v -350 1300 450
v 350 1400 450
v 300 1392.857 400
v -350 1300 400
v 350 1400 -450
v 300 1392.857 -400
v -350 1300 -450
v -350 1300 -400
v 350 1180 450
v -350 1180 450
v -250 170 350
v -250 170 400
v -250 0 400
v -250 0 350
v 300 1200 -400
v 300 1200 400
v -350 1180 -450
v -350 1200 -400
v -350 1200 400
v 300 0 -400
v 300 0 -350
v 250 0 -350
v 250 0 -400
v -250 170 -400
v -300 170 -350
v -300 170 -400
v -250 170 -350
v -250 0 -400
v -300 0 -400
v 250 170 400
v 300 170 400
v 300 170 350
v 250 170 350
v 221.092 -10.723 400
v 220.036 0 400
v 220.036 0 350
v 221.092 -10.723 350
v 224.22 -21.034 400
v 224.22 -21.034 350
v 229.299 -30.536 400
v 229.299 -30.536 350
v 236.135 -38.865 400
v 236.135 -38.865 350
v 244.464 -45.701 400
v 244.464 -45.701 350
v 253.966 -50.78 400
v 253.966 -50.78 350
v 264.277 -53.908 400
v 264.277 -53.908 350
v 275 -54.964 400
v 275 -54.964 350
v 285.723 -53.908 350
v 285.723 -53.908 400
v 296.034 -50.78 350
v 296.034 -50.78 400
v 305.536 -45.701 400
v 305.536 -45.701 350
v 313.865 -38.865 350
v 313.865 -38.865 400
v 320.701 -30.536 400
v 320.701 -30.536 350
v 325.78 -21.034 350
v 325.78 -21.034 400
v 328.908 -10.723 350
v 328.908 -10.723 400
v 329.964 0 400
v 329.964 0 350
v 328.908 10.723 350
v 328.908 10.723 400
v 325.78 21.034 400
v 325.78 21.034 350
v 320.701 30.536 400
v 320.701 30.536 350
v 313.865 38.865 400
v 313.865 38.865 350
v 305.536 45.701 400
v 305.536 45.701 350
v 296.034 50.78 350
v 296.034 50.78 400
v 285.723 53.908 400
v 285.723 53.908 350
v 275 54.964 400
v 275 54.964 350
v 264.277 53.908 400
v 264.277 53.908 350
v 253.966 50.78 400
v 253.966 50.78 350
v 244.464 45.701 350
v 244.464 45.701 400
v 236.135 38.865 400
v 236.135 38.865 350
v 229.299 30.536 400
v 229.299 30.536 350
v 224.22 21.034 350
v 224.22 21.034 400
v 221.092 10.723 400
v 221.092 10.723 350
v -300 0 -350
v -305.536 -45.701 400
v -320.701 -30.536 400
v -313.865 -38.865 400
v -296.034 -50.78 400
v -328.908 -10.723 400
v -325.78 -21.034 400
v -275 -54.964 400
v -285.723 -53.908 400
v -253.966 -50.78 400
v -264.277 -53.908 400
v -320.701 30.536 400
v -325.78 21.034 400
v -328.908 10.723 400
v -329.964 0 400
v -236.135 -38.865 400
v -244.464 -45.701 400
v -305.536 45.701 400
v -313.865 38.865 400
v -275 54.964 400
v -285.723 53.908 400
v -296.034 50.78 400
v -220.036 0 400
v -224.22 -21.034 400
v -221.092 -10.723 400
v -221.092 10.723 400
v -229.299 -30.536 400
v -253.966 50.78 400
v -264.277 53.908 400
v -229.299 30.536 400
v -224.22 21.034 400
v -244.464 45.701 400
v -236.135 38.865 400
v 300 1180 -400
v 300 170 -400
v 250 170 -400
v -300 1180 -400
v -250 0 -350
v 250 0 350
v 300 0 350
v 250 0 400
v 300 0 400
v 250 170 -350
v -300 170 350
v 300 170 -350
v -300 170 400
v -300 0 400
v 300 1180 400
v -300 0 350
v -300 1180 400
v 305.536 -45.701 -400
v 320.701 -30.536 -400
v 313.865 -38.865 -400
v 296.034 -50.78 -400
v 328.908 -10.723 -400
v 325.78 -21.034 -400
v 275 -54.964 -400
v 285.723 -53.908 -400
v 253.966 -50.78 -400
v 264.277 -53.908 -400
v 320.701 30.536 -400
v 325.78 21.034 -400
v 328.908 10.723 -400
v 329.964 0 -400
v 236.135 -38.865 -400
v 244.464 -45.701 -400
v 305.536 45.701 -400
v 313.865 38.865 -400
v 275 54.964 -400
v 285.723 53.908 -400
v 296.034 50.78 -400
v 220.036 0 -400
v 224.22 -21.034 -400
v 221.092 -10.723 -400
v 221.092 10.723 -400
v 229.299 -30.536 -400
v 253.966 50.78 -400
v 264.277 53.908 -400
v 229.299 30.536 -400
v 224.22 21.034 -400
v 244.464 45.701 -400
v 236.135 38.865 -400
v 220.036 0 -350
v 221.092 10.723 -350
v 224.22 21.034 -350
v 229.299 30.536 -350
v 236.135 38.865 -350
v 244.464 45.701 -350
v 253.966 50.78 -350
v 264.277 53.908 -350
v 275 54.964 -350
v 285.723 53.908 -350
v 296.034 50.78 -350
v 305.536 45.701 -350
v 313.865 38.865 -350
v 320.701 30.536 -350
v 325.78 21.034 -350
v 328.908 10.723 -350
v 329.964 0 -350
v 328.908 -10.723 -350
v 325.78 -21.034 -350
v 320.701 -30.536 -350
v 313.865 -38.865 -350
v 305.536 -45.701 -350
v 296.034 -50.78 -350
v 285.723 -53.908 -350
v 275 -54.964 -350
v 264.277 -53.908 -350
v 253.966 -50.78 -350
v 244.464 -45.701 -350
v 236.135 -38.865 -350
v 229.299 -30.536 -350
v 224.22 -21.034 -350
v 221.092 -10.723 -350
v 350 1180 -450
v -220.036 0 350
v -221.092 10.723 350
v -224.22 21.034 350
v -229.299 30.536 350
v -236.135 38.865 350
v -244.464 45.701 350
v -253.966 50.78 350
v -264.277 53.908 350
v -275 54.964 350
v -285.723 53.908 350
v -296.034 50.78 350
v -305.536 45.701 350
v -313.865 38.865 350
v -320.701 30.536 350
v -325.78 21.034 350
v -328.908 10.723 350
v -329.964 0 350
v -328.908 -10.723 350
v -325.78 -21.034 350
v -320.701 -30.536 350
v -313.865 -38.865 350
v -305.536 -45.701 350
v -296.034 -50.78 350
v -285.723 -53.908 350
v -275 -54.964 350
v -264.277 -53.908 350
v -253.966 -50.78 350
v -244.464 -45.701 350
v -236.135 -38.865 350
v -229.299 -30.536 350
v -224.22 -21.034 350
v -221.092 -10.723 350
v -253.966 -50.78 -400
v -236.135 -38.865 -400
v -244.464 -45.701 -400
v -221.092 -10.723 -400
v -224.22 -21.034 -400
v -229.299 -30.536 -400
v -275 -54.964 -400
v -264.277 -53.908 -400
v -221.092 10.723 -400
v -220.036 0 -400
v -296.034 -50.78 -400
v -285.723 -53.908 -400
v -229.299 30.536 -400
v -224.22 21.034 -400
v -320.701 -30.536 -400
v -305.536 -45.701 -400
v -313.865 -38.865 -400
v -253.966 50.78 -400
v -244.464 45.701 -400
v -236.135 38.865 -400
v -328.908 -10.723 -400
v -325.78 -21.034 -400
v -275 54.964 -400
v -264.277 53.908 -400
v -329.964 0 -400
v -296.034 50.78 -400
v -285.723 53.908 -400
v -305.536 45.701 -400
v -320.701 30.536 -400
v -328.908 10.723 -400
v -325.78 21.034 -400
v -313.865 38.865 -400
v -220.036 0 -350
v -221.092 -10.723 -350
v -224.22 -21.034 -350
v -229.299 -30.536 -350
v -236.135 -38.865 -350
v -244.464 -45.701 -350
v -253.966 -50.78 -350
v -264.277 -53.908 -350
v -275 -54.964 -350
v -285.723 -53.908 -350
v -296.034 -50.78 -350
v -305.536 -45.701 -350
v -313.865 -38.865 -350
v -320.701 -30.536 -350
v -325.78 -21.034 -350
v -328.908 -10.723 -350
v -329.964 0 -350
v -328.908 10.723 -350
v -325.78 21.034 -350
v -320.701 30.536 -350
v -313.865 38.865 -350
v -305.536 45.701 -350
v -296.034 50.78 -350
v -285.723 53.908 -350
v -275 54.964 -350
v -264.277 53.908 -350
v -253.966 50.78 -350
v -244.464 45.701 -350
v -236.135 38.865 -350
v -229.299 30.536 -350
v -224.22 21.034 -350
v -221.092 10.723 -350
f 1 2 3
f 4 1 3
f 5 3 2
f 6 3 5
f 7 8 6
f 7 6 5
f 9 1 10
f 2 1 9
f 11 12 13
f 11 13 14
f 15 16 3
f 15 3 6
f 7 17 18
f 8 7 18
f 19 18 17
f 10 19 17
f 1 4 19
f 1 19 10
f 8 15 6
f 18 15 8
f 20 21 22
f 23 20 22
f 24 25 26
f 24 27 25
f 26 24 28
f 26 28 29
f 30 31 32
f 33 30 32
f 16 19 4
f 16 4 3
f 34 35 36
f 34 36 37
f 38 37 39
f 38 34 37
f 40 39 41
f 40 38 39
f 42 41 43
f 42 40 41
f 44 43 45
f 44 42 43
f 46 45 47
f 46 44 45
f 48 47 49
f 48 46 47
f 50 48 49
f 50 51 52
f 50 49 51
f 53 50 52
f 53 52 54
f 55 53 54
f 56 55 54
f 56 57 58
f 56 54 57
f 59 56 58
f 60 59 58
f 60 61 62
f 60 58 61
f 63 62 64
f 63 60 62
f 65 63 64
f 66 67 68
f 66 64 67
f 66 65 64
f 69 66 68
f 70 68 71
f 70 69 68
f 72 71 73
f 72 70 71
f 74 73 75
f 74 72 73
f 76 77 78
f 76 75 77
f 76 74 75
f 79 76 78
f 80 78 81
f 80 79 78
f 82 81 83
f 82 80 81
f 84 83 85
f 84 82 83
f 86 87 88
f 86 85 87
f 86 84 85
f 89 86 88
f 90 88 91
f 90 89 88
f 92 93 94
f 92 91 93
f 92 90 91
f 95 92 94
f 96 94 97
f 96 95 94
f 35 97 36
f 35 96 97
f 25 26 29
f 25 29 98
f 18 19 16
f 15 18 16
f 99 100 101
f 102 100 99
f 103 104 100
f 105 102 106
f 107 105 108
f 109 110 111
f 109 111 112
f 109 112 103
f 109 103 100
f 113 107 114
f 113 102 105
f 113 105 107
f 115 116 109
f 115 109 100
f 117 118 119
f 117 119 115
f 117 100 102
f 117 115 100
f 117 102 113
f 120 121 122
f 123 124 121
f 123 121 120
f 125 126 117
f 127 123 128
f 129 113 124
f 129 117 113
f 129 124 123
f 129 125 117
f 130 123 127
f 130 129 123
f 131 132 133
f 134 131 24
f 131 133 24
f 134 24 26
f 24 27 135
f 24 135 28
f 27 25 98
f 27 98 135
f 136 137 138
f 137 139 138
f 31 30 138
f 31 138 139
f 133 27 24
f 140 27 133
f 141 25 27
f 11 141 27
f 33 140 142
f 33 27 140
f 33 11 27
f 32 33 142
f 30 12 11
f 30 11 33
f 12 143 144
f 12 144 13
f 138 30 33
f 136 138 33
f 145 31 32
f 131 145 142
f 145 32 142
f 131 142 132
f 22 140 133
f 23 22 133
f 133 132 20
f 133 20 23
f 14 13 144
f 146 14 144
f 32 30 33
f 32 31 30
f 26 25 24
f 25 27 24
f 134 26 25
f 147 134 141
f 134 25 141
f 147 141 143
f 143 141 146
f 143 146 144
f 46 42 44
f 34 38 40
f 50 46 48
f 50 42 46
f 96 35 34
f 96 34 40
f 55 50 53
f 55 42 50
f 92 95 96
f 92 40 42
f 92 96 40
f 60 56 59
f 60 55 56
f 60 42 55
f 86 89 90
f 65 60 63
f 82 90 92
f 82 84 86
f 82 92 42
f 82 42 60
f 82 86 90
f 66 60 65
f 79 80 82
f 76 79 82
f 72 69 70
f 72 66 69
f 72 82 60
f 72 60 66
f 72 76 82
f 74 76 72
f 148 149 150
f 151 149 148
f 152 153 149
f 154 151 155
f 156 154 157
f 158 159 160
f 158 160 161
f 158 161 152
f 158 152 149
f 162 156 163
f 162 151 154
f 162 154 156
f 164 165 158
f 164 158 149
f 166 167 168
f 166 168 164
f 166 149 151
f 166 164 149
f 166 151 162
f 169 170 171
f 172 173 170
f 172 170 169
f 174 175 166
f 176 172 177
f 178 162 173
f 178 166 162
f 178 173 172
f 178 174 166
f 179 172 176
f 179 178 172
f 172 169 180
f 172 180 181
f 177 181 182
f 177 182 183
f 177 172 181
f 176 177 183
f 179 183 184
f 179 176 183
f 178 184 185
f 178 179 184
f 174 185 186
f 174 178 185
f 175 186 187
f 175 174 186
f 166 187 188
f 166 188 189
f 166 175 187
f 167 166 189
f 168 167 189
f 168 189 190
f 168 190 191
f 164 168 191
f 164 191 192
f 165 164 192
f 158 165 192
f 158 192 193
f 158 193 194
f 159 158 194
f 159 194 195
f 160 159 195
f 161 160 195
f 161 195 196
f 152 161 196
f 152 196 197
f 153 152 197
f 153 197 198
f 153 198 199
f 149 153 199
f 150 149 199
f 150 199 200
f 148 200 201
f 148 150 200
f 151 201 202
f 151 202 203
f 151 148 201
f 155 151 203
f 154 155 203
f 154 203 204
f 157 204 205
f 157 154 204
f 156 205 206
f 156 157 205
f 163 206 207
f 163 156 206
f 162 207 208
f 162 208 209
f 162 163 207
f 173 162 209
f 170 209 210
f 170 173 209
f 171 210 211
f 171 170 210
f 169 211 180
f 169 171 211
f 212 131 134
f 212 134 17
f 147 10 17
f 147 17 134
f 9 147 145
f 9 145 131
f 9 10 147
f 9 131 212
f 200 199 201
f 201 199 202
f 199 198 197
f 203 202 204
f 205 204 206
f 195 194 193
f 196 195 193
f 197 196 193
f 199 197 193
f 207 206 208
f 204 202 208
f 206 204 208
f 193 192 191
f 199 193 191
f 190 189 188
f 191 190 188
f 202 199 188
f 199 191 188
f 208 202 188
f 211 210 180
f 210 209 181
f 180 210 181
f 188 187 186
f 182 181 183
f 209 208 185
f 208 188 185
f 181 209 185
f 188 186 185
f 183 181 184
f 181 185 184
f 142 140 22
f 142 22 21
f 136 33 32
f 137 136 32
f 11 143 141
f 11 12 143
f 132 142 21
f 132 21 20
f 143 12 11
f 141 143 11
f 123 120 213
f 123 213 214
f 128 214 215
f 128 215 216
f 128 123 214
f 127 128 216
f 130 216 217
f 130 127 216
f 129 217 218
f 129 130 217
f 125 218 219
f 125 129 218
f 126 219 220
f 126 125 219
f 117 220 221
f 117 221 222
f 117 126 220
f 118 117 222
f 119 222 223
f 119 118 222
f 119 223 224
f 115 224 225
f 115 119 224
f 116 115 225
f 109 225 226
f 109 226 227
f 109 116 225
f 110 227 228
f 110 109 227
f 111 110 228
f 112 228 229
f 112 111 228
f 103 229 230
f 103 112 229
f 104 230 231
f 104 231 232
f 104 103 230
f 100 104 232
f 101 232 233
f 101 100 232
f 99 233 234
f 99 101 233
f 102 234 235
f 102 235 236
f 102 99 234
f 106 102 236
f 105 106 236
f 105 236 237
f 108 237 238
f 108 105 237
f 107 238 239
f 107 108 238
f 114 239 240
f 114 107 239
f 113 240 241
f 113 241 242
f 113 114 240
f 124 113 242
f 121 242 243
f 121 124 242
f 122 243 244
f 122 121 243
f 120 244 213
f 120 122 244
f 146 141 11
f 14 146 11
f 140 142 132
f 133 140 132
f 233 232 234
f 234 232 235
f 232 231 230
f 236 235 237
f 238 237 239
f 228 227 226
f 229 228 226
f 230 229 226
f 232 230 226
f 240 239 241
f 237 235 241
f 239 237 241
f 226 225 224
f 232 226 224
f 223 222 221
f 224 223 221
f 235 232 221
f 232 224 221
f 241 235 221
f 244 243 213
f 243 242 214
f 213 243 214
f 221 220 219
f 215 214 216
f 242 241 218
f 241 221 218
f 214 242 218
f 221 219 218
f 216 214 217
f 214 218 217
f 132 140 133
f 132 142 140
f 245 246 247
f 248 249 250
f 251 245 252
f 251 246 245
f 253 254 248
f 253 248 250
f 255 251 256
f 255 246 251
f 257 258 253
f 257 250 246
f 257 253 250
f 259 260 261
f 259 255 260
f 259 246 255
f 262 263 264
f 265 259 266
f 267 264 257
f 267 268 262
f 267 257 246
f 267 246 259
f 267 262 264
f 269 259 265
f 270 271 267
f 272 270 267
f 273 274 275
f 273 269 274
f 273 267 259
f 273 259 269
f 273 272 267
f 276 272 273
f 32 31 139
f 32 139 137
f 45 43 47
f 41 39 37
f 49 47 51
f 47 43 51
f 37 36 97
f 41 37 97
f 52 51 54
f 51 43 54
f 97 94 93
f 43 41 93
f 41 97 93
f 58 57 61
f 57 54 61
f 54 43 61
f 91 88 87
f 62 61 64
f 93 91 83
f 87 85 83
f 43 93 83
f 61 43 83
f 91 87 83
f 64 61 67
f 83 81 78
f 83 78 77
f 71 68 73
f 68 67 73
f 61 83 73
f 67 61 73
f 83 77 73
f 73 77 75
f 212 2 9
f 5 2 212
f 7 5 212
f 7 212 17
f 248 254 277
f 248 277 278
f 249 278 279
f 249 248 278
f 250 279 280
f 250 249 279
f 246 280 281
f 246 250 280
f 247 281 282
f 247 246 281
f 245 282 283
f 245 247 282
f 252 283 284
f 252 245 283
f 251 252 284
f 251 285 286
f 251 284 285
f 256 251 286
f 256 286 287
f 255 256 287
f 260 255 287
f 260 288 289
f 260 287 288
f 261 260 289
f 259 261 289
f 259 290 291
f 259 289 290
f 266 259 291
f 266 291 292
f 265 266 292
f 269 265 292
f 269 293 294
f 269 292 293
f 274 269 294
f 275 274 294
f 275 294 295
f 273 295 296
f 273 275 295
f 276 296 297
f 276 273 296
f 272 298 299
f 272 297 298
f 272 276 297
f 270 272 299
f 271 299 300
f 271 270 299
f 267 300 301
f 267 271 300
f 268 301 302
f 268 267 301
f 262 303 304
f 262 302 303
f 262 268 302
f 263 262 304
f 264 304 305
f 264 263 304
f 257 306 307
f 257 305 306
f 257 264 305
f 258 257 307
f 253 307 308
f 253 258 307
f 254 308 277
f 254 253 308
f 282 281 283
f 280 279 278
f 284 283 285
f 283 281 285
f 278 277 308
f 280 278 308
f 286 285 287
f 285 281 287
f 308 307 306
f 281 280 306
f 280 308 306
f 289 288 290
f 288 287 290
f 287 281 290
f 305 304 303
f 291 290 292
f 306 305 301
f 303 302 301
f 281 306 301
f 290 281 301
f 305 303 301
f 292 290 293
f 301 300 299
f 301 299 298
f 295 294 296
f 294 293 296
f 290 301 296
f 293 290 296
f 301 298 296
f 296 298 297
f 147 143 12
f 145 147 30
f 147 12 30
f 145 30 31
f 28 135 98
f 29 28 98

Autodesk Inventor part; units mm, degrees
ref_plane "YZ Plane" through (0, 0, 0) normal (1, 0, 0) x (0, 1, 0)
sketch "草圖1" plane through (0, 0, 0) normal (0, 1, 0) x (-1, 0, 0)
  line L0 (300, 400) -> (-300, 400)
  line L1 (-300, 400) -> (-300, -400)
  line L2 (-300, -400) -> (300, -400)
  line L3 (300, -400) -> (300, 400)
  line L4 (300, 400) -> (-300, -400) construction
  line L5 (-300, 400) -> (300, -400) construction
  point P0 (0, 0)
  dimension "d0" = 600
  dimension "d1" = 800
extrude "擠出1" add sketch "草圖1" along normal blind 1200
sketch "草圖2" plane through (0, 1200, 0) normal (0, 1, 0) x (1, 0, 0)
  line L0 (-300, -400) -> (300, -400) projected
  line L1 (300, -400) -> (300, 400) projected
  line L2 (300, 400) -> (-300, 400) projected
  line L3 (-300, 400) -> (-300, -400) projected
  line L4 (350, 450) -> (350, -450)
  line L5 (350, -450) -> (-350, -450)
  line L6 (-350, -450) -> (-350, 450)
  line L7 (-350, 450) -> (350, 450)
  point P0 (0, 0)
  dimension "d4" = 50
extrude "擠出2" add sketch "草圖2" along normal blind 200
ref_plane "工作平面1" through (350, 1400, -450) normal (0.1414214, -0.9899495, 0) x (0, 0, 1)
split "分割1" plane through (350, 1400, -450) removes the side toward (-0.1414214, 0.9899495, 0)
sketch "草圖3" plane through (-300, 1200, 400) normal (1, 0, 0) x (0, 0, -1)
  line L0 (800, 107.1429) -> (0, 107.1429) projected
  line L1 (0, 0) -> (0, 107.1429) projected
  line L2 (800, 0) -> (0, 0) projected
  line L3 (800, 0) -> (800, 107.1429) projected
  point P0 (400, -1200)
extrude "擠出3" cut sketch "草圖3" against normal through all
sketch "草圖4" plane through (0, 1200, 0) normal (0, -1, 0) x (1, 0, 0)
  line L0 (-350, 400) -> (-300, 400) projected
  line L1 (-300, 400) -> (300, 400) projected
  line L2 (300, 400) -> (300, -400) projected
  line L3 (300, -400) -> (-300, -400) projected
  line L4 (-300, -400) -> (-350, -400) projected
  line L5 (-350, -450) -> (-350, -400) projected
  line L6 (350, -450) -> (-350, -450) projected
  line L7 (350, 450) -> (350, -450) projected
  line L8 (-350, 450) -> (350, 450) projected
  line L9 (-350, 400) -> (-350, 450) projected
  line L10 (-350, -450) -> (-350, -400) projected
  line L11 (-350, 400) -> (-300, 400) projected
  line L12 (-350, -400) -> (-350, 400)
  point P0 (0, 0)
extrude "擠出4" add sketch "草圖4" along normal blind 20
sketch "草圖5" plane through (0, 0, 0) normal (0, -1, 0) x (1, 0, 0)
  line L0 (-300, 400) -> (300, 400) projected
  line L1 (-300, -400) -> (-300, 400) projected
  line L2 (300, -400) -> (-300, -400) projected
  line L3 (300, 400) -> (300, -400) projected
  line L4 (-300, -400) -> (-300, 400) projected
  line L5 (-300, 350) -> (300, 350)
  line L6 (-300, -350) -> (300, -350)
  line L7 (300, 400) -> (300, -400) projected
  line L8 (-300, 400) -> (300, 400) projected
  line L9 (-250, 400) -> (-250, -400)
  line L10 (300, -400) -> (-300, -400) projected
  line L11 (250, 400) -> (250, -400)
  point P0 (0, 0)
  point P1 (-250, -350)
  point P2 (250, -350)
  point P3 (250, 350)
  point P4 (-250, 350)
  dimension "d11" = 50
  dimension "d12" = 50
  dimension "d13" = 50
  dimension "d14" = 50
extrude "擠出5" cut sketch "草圖5" against normal blind 170 contours L0 L11 L5 L9 | L5 L9 L6 L1 | L5 L11 L6 L9 | L5 L3 L6 L11 | L6 L11 L2 L9
sketch "草圖6" plane through (-300, 1180, 400) normal (0, 0, 1) x (1, 0, 0)
  line L0 (50, -1180) -> (0, -1180) projected
  circle A0 centre (25, -1180) radius 54.964
  point P0 (300, -1180)
extrude "擠出6" add sketch "草圖6" against normal up to surface (50 mm away) separate body
mirror "鏡射1" about plane through (0, 0, 0) normal (1, 0, 0) bodies 2
mirror "鏡射2" about plane through (0, 0, 0) normal (0, 0, 1) bodies 2
ref_plane "工作平面2" through (0, 170, 0) normal (0, -1, 0) x (1, 0, 0)
split body "分割2" result two bodies by plane through (0, 170, 0) normal (0, -1, 0) bodies 1 first body at (-283.3333, 56.6667, -350.5) (-299.5, 113.3333, 366.6667) (283.3333, 56.6667, 350.5) (299.5, 113.3333, -366.6667)
equation "\"d12\" = d11"
equation "\"d13\" = d12"
equation "\"d14\" = d12"
properties part number "傳統主席台"
